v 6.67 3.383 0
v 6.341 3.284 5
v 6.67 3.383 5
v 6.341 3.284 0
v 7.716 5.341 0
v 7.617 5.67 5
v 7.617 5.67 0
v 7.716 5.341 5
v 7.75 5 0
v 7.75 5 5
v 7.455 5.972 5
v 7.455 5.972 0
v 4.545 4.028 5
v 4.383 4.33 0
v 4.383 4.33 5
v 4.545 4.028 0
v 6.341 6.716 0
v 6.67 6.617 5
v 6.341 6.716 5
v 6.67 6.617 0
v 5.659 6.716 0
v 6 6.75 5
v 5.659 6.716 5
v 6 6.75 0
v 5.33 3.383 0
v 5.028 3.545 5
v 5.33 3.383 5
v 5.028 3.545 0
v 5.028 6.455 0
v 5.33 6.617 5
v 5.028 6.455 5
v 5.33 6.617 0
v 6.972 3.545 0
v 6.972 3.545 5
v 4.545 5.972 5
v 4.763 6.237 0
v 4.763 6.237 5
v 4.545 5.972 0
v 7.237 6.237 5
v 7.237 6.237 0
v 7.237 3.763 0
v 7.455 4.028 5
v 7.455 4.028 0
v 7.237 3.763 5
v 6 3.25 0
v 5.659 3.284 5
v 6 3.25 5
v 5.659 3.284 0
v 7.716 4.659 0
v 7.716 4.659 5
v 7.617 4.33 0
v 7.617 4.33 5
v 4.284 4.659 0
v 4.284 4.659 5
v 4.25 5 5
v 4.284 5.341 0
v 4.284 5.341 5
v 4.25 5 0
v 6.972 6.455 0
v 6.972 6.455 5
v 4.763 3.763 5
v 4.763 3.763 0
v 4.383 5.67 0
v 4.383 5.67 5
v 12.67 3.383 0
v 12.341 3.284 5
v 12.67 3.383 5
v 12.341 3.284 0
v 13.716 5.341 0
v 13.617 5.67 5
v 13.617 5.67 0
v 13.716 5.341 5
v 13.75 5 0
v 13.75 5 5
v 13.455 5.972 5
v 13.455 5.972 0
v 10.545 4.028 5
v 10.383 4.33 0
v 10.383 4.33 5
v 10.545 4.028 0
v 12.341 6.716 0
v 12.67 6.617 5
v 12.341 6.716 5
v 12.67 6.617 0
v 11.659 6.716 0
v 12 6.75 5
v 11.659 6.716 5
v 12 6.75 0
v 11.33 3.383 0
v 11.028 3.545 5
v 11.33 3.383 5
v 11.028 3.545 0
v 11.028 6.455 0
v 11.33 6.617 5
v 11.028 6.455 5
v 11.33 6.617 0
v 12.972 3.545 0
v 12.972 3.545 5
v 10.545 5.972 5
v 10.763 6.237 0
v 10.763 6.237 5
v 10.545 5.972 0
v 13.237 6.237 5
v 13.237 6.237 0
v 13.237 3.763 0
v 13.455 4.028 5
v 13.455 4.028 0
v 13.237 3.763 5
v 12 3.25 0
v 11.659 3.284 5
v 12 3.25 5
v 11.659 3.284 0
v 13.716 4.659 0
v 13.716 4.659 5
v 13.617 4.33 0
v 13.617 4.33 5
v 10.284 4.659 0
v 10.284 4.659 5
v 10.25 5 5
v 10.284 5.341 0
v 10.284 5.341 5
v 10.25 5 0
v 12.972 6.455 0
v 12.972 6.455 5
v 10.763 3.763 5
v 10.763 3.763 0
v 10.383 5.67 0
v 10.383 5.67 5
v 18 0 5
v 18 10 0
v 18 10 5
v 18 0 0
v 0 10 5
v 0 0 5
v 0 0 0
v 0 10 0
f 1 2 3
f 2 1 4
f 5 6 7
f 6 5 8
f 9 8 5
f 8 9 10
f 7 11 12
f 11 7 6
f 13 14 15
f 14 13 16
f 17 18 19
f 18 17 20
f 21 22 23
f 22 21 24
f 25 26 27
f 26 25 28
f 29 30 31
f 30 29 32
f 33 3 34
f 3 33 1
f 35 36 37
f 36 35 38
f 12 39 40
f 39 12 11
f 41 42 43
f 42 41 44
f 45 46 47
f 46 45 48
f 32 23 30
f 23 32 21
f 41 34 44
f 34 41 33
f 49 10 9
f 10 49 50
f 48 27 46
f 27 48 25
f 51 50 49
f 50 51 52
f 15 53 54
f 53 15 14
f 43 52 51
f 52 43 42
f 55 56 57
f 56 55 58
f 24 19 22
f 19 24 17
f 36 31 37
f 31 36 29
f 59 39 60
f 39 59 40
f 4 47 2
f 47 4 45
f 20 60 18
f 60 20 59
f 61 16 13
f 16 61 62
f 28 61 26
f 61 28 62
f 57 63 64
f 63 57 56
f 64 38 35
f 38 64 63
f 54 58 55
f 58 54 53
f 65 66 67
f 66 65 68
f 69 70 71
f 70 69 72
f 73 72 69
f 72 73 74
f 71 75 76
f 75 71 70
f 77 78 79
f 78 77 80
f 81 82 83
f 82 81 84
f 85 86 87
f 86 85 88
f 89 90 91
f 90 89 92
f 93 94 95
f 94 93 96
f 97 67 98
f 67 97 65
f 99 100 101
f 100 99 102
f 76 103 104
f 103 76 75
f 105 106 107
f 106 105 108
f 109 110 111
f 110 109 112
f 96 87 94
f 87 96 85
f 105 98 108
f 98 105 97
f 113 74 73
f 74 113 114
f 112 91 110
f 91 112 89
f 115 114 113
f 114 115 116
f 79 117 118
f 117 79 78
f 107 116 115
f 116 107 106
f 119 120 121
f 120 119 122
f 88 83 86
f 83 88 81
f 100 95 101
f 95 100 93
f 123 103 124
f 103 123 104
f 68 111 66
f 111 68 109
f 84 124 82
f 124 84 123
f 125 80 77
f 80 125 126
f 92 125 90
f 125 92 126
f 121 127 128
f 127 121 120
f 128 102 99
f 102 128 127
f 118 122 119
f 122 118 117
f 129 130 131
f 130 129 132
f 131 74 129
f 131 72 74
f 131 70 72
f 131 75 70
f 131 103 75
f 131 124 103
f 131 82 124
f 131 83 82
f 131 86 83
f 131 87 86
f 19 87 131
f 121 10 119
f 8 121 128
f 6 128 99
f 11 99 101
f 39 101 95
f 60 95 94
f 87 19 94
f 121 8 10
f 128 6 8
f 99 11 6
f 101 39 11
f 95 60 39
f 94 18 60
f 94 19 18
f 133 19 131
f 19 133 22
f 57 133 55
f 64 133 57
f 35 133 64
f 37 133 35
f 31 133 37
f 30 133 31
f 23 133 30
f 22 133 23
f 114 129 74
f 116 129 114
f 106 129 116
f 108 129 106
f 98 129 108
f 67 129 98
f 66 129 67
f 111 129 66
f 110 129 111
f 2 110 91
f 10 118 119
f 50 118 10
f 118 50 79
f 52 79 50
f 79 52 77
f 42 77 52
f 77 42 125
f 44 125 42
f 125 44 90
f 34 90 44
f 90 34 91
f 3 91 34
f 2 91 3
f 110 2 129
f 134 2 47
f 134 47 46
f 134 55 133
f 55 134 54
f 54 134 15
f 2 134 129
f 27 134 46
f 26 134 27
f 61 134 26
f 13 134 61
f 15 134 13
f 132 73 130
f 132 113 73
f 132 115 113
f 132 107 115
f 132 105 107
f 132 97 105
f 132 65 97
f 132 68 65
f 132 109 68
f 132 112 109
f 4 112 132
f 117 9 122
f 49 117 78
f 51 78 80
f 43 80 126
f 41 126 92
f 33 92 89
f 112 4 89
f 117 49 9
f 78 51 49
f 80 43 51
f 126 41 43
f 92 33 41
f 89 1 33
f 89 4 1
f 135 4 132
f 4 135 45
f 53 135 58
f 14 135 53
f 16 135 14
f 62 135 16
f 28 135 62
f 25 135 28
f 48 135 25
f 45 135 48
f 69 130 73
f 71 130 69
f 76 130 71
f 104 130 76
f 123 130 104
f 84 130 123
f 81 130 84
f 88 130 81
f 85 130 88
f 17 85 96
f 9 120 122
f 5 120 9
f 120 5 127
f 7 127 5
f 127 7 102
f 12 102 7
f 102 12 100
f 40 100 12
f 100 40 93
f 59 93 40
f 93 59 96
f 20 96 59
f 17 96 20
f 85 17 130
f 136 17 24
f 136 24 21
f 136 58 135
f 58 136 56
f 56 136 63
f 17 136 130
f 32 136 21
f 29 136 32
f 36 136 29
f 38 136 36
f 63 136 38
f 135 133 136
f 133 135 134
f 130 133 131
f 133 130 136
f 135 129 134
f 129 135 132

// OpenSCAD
$fn = 32;

// ----------------------------------------------------------------------
// Micro pad: two-hole pad, 5-20 mm class
// ----------------------------------------------------------------------

// --- parameters (mm) ---
pad_l = 18;               // pad length, X
pad_w = 10;               // pad width, Y
pad_t = 5;                // pad thickness, Z
hole_d = 3.5;             // hole diameter
hole_x = 6;               // X of the first hole centre
fit_tol = 0.05;           // tolerance for press fits, mm
free_tol = 0.2;           // tolerance for clearance fits, mm

difference() {
  cube([pad_l, pad_w, pad_t]);
  for (x = [hole_x, pad_l - hole_x])
    translate([x, pad_w / 2, -1])
      cylinder(h = pad_t + 2, d = hole_d);
}
